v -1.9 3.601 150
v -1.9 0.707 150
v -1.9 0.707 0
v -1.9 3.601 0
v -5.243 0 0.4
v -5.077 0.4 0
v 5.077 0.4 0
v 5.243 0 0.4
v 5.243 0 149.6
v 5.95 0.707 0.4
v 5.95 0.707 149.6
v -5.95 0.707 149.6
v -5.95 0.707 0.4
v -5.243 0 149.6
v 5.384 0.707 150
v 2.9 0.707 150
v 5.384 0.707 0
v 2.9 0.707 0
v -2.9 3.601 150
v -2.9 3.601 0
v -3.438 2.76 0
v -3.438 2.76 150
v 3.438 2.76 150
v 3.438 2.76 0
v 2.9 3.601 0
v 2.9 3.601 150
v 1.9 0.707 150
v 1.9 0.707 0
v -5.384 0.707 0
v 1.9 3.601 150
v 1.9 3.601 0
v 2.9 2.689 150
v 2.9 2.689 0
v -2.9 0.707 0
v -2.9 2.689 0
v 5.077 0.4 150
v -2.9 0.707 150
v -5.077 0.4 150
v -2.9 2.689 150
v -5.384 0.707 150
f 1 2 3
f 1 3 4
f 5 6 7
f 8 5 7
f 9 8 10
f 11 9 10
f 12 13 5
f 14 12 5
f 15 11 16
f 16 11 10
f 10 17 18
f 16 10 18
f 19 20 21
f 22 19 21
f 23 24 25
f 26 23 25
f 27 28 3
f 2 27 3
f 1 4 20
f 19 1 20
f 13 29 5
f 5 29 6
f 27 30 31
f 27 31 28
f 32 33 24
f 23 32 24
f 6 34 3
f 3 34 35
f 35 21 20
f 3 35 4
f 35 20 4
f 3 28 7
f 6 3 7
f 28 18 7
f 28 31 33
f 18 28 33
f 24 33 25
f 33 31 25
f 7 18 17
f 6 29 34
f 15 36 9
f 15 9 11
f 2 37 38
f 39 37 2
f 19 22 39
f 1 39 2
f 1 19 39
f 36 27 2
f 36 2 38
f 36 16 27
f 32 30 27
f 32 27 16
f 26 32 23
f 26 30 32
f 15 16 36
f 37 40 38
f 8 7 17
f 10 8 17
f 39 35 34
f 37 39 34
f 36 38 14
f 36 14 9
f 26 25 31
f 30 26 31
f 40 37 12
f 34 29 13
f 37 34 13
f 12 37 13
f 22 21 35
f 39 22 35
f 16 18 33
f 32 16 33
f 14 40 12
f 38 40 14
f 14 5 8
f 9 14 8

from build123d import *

# Parameters (mm, degrees)
BOSS_EXTRUDE1_DEPTH = 150
CHAMFER2_SIZE       = 0.4


with BuildPart() as part:
    # Sketch1 → Boss-Extrude1 (new body)
    with BuildSketch(Plane.XY):
        Polygon((5.95, 0.70711), (2.9, 0.70711), (2.9, 2.68877), (3.438098658, 2.759612032), (2.9, 3.60069), (1.9, 3.60069), (1.9, 0.70711), (-1.9, 0.70711), (-1.9, 3.60069), (-2.9, 3.60069), (-3.438098658, 2.759612032), (-2.9, 2.68877), (-2.9, 0.70711), (-5.95, 0.70711), (-5.24289, 0), (5.24289, 0), align=None)
    extrude(amount=BOSS_EXTRUDE1_DEPTH)

    # Chamfer2
    chamfer2_edges = [part.edges().sort_by_distance(p)[0] for p in [
        (5.596445, 0.353555, 0),
        (0, 0, 0),
        (-5.596445, 0.353555, 0),
        (-5.596445, 0.353555, 150),
        (0, 0, 150),
        (5.596445, 0.353555, 150),
    ]]
    chamfer(chamfer2_edges, length=CHAMFER2_SIZE)


solid = part.part
